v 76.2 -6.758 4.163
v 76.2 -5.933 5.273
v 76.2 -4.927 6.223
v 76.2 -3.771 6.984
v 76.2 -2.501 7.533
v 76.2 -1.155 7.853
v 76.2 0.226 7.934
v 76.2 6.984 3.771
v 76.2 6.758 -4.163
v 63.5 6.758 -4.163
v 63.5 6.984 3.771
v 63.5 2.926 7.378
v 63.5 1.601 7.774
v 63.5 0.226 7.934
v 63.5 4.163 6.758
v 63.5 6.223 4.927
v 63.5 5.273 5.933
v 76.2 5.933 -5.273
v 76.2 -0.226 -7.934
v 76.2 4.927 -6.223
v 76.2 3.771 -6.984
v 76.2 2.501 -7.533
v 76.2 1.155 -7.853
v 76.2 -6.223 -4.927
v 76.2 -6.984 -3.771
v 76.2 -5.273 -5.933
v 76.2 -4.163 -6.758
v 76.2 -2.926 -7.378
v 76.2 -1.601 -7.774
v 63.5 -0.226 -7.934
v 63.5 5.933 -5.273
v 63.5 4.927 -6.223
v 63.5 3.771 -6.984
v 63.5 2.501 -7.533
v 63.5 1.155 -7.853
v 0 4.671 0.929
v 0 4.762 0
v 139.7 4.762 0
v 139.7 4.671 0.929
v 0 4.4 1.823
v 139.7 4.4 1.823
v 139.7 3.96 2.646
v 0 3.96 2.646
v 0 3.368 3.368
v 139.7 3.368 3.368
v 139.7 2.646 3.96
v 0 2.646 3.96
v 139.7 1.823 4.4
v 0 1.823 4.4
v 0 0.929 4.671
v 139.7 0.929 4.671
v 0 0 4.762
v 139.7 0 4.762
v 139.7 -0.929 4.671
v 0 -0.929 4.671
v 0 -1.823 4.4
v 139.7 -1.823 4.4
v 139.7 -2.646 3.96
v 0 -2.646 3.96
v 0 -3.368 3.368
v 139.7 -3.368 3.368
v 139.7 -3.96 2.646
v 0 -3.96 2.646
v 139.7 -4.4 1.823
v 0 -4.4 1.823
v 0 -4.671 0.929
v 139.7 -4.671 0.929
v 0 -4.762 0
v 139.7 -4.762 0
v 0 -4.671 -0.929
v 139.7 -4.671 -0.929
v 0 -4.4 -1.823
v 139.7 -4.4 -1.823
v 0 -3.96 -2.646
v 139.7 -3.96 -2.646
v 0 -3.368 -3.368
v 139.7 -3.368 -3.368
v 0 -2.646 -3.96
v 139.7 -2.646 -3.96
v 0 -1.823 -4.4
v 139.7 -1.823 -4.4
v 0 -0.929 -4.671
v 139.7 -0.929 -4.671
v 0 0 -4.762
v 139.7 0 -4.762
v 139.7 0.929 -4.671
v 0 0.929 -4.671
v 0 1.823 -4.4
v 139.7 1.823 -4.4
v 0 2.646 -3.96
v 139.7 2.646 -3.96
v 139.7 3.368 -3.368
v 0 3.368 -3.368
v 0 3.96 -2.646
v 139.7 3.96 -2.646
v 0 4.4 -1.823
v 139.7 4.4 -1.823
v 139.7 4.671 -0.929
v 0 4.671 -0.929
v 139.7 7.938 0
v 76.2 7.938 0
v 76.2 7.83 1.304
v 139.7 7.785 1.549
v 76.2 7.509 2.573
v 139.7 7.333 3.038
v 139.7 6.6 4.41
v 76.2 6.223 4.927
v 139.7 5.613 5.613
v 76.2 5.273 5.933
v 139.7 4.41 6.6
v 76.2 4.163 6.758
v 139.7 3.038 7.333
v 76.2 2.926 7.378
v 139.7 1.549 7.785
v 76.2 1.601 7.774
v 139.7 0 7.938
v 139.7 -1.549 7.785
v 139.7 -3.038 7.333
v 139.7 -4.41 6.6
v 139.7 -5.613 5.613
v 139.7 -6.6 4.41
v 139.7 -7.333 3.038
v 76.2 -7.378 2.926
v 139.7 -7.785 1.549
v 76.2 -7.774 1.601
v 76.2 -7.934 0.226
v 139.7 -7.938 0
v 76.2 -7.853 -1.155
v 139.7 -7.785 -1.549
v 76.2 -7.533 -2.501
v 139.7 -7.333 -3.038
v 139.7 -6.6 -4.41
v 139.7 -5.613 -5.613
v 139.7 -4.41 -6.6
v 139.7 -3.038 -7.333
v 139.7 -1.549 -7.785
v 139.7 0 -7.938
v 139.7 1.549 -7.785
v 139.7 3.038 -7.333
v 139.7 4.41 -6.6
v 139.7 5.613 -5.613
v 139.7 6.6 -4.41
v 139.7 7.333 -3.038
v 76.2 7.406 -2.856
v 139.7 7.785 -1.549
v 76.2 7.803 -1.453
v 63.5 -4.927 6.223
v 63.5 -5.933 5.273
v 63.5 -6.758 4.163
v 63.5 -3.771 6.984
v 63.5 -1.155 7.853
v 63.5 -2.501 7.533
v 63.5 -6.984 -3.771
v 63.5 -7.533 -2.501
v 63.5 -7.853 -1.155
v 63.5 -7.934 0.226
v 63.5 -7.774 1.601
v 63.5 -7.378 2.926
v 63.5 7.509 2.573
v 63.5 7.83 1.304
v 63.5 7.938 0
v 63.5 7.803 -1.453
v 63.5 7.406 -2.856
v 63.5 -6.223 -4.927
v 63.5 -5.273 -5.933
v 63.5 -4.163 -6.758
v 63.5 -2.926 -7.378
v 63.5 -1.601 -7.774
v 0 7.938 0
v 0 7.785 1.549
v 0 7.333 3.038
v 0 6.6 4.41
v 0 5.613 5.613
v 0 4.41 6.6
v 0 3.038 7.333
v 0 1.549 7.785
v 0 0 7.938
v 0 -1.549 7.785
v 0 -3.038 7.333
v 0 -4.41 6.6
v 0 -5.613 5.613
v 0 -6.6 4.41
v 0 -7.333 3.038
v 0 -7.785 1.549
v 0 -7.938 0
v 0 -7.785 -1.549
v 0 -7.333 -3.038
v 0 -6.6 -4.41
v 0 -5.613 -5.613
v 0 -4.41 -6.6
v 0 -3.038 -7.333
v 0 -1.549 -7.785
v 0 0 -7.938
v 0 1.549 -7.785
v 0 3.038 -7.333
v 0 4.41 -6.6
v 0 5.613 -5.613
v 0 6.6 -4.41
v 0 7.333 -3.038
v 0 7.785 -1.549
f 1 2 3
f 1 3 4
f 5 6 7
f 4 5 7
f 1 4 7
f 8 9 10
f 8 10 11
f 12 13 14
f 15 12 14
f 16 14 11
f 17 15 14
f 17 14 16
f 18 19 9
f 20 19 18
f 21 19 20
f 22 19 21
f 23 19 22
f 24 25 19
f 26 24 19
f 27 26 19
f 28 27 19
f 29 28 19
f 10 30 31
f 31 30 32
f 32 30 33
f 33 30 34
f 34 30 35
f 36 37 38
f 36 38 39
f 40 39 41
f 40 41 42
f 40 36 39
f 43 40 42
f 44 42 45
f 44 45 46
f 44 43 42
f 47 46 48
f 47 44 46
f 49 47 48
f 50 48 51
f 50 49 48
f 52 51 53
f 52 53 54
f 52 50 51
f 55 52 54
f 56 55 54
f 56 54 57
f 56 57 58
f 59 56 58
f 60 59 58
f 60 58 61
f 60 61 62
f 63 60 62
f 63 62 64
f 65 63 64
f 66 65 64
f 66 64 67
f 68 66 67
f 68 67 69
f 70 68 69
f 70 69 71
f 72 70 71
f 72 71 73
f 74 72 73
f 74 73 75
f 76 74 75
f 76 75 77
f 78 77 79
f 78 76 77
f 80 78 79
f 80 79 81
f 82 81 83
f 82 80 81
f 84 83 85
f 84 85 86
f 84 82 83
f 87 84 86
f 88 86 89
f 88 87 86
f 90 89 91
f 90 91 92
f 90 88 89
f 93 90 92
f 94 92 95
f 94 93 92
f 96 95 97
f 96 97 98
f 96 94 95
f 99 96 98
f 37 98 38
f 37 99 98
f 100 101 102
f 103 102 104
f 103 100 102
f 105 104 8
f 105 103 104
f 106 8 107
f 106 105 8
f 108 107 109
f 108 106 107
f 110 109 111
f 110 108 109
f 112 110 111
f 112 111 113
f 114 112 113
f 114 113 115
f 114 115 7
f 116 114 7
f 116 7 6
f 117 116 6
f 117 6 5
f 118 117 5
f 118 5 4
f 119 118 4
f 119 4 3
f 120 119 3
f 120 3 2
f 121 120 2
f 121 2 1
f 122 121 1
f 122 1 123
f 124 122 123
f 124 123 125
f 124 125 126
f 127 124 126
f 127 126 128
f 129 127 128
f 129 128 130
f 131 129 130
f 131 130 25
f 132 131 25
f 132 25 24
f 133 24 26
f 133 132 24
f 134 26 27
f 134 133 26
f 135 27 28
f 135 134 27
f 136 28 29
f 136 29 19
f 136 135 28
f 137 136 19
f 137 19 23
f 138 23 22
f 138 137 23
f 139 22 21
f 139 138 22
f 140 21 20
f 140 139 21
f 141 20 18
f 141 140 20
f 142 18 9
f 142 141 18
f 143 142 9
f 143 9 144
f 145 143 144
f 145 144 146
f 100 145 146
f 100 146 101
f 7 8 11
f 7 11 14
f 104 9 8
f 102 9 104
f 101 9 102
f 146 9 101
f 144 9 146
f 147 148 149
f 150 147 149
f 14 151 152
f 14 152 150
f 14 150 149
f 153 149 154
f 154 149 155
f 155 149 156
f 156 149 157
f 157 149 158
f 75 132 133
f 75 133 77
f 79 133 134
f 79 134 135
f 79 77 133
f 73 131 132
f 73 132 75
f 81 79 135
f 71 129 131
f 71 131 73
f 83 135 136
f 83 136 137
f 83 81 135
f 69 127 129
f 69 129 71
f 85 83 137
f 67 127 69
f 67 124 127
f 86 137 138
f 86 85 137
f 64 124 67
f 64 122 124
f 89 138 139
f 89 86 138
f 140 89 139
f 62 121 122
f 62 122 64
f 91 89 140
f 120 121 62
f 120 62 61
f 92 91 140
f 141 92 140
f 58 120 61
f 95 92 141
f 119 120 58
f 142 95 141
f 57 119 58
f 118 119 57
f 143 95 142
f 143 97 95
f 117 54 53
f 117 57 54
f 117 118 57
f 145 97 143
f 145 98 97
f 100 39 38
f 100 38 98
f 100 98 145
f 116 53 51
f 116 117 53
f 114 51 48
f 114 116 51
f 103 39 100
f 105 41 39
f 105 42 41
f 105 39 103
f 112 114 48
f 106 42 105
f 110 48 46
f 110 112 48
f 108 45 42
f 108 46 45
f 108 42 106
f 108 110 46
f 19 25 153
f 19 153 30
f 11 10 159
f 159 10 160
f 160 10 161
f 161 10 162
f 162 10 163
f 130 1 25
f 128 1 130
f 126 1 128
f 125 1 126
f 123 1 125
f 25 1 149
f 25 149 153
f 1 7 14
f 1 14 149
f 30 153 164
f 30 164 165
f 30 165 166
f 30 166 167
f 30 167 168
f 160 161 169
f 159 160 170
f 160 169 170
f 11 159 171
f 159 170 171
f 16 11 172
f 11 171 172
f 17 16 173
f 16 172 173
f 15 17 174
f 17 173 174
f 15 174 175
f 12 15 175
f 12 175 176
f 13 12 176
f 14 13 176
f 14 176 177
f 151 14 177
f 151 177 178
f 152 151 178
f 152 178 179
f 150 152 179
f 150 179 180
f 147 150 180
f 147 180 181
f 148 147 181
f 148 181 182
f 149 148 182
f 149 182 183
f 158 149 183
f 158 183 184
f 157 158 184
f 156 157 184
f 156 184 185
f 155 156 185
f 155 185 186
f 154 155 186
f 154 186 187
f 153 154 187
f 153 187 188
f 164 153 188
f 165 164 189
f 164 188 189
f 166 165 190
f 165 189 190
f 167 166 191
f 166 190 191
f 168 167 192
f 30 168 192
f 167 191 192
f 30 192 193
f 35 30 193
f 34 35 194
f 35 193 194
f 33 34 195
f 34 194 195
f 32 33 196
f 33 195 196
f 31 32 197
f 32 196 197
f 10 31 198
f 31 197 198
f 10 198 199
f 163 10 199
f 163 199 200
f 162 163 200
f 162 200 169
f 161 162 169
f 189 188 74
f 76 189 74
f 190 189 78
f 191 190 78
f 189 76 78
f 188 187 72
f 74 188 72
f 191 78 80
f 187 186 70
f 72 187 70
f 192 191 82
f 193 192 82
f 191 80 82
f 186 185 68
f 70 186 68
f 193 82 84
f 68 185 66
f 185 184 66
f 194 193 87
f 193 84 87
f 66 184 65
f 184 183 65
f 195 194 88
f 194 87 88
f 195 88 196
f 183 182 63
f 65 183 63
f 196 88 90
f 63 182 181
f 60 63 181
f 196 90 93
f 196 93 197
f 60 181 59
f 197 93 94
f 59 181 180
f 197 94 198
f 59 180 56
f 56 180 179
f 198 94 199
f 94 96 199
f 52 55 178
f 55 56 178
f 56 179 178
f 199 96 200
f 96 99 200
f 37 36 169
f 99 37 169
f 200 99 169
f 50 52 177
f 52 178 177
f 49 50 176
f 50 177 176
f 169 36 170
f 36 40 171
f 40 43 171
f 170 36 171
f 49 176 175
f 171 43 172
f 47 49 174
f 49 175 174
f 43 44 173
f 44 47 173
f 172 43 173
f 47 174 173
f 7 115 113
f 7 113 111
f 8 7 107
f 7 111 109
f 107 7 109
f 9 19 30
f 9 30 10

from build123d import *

# Parameters (mm, degrees)
F0_R     = 15.875
F0_R_2   = 9.525
F1_DEPTH = 127
F2_R     = 9.525
F3_DEPTH = 12.7
F5_SCALE = 0.5


with BuildPart() as f1:
    # F0 (on Right) → F1 (new body)
    with BuildSketch(Plane.YZ):
        Circle(F0_R)
        Circle(F0_R_2, mode=Mode.SUBTRACT)
    extrude(amount=F1_DEPTH)

    # F2 (on face) → F3 (join)
    with BuildSketch(Plane.YZ.offset(127)):
        Polygon((-0.4526267682, -15.8685460584), (13.5162506236, -8.3262593089), (13.9688773918, 7.5422867496), (0.4526267682, 15.8685460584), (-13.5162506236, 8.3262593089), (-13.9688773918, -7.5422867496), align=None)
        Circle(F2_R, mode=Mode.SUBTRACT)
    extrude(amount=F3_DEPTH)

    # F4: F1 across face


with BuildPart() as f1_1:
    add(f1.part)
    add(f1.part.mirror(Plane.YZ.offset(139.7)))


with BuildPart() as f1_2:
    # F5: moved
    add(f1_1.part.scale(F5_SCALE))


solid = f1_2.part
